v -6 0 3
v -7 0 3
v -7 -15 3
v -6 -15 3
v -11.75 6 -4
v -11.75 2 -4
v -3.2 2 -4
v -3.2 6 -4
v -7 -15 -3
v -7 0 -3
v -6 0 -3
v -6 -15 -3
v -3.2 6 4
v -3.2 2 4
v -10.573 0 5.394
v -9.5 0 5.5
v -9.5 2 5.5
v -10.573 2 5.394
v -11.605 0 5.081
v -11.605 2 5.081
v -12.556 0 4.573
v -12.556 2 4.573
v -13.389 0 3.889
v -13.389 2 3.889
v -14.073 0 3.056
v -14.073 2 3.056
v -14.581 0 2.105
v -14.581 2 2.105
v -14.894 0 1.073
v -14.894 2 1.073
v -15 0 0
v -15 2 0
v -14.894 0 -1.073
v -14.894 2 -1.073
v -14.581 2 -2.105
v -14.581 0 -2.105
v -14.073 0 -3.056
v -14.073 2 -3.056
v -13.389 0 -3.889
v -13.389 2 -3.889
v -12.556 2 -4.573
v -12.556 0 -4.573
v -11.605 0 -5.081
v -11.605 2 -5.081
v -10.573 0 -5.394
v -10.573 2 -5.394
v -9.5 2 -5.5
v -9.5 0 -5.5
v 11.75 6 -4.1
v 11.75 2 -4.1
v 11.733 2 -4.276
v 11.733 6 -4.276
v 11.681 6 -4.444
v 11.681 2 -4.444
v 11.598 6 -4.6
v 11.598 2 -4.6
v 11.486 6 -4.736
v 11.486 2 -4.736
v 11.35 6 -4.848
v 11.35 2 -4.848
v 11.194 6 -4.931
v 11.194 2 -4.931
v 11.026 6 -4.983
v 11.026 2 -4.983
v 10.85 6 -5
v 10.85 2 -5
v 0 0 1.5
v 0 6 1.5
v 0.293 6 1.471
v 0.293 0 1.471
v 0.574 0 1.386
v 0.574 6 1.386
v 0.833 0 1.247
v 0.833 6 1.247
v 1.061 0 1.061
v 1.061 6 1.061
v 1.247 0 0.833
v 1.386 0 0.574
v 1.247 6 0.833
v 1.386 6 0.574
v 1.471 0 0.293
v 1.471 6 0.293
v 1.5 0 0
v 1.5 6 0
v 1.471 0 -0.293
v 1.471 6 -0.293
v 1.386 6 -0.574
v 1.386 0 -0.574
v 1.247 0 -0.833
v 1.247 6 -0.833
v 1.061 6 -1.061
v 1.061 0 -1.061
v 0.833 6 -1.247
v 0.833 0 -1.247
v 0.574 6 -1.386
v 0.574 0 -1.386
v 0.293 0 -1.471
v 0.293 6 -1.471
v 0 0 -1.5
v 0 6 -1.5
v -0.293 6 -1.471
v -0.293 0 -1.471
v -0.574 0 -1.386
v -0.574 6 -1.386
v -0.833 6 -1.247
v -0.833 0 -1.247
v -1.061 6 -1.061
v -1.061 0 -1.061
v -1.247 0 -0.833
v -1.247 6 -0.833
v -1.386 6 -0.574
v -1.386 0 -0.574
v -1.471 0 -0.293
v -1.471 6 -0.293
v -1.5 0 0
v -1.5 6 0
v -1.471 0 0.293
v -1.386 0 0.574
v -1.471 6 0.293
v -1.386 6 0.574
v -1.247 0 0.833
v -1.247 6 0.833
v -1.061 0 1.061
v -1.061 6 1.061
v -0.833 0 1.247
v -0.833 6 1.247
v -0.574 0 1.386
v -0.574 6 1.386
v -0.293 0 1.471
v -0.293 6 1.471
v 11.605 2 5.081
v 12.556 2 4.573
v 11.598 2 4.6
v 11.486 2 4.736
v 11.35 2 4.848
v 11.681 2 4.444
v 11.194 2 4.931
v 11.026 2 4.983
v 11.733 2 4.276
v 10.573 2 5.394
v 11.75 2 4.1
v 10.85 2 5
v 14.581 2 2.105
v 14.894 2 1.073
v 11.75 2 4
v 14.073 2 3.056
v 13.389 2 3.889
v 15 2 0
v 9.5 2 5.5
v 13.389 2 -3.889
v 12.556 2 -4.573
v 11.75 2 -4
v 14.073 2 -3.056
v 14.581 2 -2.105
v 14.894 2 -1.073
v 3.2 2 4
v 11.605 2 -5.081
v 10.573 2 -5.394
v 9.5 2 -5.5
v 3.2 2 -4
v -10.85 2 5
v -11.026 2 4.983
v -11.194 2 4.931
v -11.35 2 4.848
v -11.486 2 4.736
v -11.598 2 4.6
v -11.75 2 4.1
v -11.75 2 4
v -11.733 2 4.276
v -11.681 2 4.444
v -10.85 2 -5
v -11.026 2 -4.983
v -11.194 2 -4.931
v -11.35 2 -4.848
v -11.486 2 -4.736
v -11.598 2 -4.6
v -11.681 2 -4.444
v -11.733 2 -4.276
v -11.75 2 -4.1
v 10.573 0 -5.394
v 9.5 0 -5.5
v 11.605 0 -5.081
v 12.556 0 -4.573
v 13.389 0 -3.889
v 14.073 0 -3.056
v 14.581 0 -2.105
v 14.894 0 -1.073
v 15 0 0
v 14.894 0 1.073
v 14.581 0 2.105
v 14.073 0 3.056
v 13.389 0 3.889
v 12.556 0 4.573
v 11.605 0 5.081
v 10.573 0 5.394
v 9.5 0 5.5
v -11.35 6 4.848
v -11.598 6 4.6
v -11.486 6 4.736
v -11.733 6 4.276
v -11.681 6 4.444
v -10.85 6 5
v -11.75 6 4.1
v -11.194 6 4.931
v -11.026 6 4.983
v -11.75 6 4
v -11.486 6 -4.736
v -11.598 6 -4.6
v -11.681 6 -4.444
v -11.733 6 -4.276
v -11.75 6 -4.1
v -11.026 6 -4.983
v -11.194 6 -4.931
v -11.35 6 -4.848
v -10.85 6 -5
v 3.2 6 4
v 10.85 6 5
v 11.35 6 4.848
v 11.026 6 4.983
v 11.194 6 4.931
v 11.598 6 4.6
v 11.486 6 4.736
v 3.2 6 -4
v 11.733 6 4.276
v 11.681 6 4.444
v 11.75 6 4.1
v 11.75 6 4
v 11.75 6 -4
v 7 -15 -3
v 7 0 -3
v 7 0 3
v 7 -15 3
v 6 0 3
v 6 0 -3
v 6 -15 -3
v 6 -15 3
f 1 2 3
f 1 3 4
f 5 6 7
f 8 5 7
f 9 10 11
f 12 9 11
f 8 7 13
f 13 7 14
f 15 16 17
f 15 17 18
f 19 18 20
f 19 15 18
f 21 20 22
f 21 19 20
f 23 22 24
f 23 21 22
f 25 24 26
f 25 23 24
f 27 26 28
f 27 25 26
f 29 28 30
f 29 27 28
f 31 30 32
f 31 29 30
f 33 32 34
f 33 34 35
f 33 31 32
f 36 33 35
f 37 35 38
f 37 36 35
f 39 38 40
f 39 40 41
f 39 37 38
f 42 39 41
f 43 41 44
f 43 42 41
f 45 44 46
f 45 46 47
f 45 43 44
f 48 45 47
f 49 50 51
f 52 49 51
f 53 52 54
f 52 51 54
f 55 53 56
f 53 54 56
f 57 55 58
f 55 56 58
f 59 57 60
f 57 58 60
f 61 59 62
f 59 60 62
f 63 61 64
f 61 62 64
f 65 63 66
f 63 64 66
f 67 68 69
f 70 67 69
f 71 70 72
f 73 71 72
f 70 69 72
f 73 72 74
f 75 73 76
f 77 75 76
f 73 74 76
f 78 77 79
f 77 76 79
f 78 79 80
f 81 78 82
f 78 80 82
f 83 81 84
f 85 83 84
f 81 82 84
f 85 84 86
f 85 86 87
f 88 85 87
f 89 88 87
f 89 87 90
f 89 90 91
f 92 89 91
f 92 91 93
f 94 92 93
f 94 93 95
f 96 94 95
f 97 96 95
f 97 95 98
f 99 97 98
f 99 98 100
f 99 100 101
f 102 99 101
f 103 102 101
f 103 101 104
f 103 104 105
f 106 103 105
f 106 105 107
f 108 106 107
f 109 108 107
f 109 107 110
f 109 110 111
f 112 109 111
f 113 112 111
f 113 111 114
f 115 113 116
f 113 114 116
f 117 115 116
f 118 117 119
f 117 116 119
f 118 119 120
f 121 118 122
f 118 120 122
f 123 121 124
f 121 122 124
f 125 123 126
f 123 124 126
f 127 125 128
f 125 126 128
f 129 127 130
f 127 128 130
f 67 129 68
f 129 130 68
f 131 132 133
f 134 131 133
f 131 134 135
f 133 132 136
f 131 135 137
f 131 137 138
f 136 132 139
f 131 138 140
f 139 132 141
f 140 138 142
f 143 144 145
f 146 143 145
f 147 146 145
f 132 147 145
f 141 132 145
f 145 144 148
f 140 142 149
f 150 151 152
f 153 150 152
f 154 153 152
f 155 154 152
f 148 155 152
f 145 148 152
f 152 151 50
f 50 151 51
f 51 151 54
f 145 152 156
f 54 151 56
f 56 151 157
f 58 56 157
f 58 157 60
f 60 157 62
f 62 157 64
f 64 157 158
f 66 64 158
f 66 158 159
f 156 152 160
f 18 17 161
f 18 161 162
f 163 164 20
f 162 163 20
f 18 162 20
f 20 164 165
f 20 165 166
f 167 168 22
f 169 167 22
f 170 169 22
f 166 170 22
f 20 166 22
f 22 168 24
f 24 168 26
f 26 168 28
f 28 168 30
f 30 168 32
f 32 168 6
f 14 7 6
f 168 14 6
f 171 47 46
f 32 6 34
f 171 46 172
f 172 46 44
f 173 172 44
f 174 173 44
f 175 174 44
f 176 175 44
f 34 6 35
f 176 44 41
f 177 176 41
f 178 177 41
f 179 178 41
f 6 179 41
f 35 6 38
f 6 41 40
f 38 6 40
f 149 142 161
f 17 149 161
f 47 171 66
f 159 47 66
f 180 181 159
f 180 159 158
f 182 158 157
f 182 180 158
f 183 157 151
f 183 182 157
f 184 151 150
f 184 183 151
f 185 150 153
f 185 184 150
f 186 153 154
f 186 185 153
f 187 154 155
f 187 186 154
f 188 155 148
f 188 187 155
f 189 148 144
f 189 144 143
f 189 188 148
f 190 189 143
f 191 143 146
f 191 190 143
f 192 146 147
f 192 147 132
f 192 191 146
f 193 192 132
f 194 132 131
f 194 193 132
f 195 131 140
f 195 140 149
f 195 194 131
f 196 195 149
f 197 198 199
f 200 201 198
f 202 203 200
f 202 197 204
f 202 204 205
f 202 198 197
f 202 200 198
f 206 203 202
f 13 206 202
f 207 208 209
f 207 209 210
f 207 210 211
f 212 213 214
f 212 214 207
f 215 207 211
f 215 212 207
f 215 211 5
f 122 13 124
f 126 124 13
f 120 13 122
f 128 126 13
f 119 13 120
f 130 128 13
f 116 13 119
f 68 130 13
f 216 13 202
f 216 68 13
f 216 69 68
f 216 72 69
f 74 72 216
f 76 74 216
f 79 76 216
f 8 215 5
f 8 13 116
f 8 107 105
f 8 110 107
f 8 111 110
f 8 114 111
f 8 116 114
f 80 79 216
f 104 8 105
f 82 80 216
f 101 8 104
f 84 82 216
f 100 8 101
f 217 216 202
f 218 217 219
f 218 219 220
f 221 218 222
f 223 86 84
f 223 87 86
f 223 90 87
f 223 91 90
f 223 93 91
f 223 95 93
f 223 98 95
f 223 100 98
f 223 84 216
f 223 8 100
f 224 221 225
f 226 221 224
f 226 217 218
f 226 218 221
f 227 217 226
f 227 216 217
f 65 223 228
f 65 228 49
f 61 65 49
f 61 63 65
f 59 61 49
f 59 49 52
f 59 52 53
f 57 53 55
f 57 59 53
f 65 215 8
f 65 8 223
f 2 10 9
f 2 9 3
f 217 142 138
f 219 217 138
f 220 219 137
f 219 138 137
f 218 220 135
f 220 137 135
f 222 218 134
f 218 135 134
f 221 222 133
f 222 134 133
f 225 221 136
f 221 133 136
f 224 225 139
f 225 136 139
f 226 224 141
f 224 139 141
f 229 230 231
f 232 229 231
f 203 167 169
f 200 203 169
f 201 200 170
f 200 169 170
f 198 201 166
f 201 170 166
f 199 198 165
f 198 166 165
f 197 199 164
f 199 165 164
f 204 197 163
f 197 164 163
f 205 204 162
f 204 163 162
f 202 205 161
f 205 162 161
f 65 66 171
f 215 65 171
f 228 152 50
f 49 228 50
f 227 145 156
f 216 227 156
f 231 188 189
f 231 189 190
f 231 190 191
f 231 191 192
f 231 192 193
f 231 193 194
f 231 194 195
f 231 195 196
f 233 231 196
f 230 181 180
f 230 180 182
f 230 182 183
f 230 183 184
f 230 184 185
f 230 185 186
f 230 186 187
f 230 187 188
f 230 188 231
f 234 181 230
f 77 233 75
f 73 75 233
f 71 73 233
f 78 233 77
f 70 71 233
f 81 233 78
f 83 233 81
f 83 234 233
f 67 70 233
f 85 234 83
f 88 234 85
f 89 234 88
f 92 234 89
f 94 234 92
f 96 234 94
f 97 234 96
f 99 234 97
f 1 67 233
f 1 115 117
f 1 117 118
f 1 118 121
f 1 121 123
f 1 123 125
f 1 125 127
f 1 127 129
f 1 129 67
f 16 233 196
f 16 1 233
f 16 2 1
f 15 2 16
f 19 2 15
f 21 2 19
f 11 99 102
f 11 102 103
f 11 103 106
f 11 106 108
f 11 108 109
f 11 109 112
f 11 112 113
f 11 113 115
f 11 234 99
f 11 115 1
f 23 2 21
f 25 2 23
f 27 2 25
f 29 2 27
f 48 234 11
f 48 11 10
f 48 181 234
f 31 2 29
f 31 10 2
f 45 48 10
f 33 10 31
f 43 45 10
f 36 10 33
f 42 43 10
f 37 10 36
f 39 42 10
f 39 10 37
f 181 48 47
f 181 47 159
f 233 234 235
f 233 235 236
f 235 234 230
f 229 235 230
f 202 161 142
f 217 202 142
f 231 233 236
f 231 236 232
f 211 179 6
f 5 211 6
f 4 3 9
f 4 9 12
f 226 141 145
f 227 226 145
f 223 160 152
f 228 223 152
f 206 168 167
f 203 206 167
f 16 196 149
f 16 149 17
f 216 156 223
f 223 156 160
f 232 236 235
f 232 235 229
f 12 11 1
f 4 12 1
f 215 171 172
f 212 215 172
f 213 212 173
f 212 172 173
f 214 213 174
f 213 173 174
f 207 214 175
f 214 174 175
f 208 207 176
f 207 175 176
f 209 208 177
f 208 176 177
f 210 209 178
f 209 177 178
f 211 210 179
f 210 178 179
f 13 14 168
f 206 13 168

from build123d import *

# Parameters (mm, degrees)
SALIENTE_EXTRUIR1_DEPTH = 2
SALIENTE_EXTRUIR2_DEPTH = 4
CORTAR_EXTRUIR1_REACH   = 19.066
CROQUIS3_R              = 1.5
CROQUIS4_W              = 1
CROQUIS4_H              = 6
SALIENTE_EXTRUIR3_DEPTH = 15


with BuildPart() as part:
    # Croquis1 → Saliente-Extruir1 (new body)
    with BuildSketch(Plane(origin=(0, 0, 0), x_dir=(1, 0, 0), z_dir=(0, 1, 0))):
        with BuildLine():
            Line((-9.5, 5.5), (9.5, 5.5))
            ThreePointArc((9.5, 5.5), (15, 0), (9.5, -5.5))
            Line((9.5, -5.5), (-9.5, -5.5))
            ThreePointArc((-9.5, -5.5), (-15, 0), (-9.5, 5.5))
        make_face()
    extrude(amount=SALIENTE_EXTRUIR1_DEPTH)

    # Croquis2 → Saliente-Extruir2 (add)
    with BuildSketch(Plane(origin=(0, 2, 0), x_dir=(1, 0, 0), z_dir=(0, 1, 0))):
        with BuildLine():
            Line((-3.2, 4), (-3.2, -4))
            Line((-3.2, -4), (-11.75, -4))
            Line((-11.75, -4), (-11.75, -4.1))
            ThreePointArc((-11.75, -4.1), (-11.486396103, -4.736396103), (-10.85, -5))
            Line((-10.85, -5), (10.85, -5))
            ThreePointArc((10.85, -5), (11.486396103, -4.736396103), (11.75, -4.1))
            Line((11.75, -4.1), (11.75, -4))
            Line((11.75, -4), (3.2, -4))
            Line((3.2, -4), (3.2, 4))
            Line((3.2, 4), (11.75, 4))
            Line((11.75, 4), (11.75, 4.1))
            ThreePointArc((11.75, 4.1), (11.486396103, 4.736396103), (10.85, 5))
            Line((10.85, 5), (-10.85, 5))
            ThreePointArc((-10.85, 5), (-11.486396103, 4.736396103), (-11.75, 4.1))
            Line((-11.75, 4.1), (-11.75, 4))
            Line((-11.75, 4), (-3.2, 4))
        make_face()
    extrude(amount=SALIENTE_EXTRUIR2_DEPTH)

    # Croquis3 → Cortar-Extruir1 (cut, up to next)
    with BuildSketch(Plane(origin=(0, 6, 0), x_dir=(1, 0, 0), z_dir=(0, 1, 0)), mode=Mode.PRIVATE) as cortar_extruir1_sk1:
        with Locations(Location((0, 0, 0), (0, 0, 270))):
            Circle(CROQUIS3_R)
    cortar_extruir1_tool1 = extrude(cortar_extruir1_sk1.sketch, amount=-CORTAR_EXTRUIR1_REACH, mode=Mode.PRIVATE) & part.part
    add(cortar_extruir1_tool1.solids().sort_by_distance((0, 6, 0))[0], mode=Mode.SUBTRACT)

    # Croquis4 → Saliente-Extruir3 (add)
    with BuildSketch(Plane.XZ):
        with Locations((-6.5, 0)):
            Rectangle(CROQUIS4_W, CROQUIS4_H)
        with Locations((6.5, 0)):
            Rectangle(CROQUIS4_W, CROQUIS4_H)
    extrude(amount=SALIENTE_EXTRUIR3_DEPTH)


solid = part.part
